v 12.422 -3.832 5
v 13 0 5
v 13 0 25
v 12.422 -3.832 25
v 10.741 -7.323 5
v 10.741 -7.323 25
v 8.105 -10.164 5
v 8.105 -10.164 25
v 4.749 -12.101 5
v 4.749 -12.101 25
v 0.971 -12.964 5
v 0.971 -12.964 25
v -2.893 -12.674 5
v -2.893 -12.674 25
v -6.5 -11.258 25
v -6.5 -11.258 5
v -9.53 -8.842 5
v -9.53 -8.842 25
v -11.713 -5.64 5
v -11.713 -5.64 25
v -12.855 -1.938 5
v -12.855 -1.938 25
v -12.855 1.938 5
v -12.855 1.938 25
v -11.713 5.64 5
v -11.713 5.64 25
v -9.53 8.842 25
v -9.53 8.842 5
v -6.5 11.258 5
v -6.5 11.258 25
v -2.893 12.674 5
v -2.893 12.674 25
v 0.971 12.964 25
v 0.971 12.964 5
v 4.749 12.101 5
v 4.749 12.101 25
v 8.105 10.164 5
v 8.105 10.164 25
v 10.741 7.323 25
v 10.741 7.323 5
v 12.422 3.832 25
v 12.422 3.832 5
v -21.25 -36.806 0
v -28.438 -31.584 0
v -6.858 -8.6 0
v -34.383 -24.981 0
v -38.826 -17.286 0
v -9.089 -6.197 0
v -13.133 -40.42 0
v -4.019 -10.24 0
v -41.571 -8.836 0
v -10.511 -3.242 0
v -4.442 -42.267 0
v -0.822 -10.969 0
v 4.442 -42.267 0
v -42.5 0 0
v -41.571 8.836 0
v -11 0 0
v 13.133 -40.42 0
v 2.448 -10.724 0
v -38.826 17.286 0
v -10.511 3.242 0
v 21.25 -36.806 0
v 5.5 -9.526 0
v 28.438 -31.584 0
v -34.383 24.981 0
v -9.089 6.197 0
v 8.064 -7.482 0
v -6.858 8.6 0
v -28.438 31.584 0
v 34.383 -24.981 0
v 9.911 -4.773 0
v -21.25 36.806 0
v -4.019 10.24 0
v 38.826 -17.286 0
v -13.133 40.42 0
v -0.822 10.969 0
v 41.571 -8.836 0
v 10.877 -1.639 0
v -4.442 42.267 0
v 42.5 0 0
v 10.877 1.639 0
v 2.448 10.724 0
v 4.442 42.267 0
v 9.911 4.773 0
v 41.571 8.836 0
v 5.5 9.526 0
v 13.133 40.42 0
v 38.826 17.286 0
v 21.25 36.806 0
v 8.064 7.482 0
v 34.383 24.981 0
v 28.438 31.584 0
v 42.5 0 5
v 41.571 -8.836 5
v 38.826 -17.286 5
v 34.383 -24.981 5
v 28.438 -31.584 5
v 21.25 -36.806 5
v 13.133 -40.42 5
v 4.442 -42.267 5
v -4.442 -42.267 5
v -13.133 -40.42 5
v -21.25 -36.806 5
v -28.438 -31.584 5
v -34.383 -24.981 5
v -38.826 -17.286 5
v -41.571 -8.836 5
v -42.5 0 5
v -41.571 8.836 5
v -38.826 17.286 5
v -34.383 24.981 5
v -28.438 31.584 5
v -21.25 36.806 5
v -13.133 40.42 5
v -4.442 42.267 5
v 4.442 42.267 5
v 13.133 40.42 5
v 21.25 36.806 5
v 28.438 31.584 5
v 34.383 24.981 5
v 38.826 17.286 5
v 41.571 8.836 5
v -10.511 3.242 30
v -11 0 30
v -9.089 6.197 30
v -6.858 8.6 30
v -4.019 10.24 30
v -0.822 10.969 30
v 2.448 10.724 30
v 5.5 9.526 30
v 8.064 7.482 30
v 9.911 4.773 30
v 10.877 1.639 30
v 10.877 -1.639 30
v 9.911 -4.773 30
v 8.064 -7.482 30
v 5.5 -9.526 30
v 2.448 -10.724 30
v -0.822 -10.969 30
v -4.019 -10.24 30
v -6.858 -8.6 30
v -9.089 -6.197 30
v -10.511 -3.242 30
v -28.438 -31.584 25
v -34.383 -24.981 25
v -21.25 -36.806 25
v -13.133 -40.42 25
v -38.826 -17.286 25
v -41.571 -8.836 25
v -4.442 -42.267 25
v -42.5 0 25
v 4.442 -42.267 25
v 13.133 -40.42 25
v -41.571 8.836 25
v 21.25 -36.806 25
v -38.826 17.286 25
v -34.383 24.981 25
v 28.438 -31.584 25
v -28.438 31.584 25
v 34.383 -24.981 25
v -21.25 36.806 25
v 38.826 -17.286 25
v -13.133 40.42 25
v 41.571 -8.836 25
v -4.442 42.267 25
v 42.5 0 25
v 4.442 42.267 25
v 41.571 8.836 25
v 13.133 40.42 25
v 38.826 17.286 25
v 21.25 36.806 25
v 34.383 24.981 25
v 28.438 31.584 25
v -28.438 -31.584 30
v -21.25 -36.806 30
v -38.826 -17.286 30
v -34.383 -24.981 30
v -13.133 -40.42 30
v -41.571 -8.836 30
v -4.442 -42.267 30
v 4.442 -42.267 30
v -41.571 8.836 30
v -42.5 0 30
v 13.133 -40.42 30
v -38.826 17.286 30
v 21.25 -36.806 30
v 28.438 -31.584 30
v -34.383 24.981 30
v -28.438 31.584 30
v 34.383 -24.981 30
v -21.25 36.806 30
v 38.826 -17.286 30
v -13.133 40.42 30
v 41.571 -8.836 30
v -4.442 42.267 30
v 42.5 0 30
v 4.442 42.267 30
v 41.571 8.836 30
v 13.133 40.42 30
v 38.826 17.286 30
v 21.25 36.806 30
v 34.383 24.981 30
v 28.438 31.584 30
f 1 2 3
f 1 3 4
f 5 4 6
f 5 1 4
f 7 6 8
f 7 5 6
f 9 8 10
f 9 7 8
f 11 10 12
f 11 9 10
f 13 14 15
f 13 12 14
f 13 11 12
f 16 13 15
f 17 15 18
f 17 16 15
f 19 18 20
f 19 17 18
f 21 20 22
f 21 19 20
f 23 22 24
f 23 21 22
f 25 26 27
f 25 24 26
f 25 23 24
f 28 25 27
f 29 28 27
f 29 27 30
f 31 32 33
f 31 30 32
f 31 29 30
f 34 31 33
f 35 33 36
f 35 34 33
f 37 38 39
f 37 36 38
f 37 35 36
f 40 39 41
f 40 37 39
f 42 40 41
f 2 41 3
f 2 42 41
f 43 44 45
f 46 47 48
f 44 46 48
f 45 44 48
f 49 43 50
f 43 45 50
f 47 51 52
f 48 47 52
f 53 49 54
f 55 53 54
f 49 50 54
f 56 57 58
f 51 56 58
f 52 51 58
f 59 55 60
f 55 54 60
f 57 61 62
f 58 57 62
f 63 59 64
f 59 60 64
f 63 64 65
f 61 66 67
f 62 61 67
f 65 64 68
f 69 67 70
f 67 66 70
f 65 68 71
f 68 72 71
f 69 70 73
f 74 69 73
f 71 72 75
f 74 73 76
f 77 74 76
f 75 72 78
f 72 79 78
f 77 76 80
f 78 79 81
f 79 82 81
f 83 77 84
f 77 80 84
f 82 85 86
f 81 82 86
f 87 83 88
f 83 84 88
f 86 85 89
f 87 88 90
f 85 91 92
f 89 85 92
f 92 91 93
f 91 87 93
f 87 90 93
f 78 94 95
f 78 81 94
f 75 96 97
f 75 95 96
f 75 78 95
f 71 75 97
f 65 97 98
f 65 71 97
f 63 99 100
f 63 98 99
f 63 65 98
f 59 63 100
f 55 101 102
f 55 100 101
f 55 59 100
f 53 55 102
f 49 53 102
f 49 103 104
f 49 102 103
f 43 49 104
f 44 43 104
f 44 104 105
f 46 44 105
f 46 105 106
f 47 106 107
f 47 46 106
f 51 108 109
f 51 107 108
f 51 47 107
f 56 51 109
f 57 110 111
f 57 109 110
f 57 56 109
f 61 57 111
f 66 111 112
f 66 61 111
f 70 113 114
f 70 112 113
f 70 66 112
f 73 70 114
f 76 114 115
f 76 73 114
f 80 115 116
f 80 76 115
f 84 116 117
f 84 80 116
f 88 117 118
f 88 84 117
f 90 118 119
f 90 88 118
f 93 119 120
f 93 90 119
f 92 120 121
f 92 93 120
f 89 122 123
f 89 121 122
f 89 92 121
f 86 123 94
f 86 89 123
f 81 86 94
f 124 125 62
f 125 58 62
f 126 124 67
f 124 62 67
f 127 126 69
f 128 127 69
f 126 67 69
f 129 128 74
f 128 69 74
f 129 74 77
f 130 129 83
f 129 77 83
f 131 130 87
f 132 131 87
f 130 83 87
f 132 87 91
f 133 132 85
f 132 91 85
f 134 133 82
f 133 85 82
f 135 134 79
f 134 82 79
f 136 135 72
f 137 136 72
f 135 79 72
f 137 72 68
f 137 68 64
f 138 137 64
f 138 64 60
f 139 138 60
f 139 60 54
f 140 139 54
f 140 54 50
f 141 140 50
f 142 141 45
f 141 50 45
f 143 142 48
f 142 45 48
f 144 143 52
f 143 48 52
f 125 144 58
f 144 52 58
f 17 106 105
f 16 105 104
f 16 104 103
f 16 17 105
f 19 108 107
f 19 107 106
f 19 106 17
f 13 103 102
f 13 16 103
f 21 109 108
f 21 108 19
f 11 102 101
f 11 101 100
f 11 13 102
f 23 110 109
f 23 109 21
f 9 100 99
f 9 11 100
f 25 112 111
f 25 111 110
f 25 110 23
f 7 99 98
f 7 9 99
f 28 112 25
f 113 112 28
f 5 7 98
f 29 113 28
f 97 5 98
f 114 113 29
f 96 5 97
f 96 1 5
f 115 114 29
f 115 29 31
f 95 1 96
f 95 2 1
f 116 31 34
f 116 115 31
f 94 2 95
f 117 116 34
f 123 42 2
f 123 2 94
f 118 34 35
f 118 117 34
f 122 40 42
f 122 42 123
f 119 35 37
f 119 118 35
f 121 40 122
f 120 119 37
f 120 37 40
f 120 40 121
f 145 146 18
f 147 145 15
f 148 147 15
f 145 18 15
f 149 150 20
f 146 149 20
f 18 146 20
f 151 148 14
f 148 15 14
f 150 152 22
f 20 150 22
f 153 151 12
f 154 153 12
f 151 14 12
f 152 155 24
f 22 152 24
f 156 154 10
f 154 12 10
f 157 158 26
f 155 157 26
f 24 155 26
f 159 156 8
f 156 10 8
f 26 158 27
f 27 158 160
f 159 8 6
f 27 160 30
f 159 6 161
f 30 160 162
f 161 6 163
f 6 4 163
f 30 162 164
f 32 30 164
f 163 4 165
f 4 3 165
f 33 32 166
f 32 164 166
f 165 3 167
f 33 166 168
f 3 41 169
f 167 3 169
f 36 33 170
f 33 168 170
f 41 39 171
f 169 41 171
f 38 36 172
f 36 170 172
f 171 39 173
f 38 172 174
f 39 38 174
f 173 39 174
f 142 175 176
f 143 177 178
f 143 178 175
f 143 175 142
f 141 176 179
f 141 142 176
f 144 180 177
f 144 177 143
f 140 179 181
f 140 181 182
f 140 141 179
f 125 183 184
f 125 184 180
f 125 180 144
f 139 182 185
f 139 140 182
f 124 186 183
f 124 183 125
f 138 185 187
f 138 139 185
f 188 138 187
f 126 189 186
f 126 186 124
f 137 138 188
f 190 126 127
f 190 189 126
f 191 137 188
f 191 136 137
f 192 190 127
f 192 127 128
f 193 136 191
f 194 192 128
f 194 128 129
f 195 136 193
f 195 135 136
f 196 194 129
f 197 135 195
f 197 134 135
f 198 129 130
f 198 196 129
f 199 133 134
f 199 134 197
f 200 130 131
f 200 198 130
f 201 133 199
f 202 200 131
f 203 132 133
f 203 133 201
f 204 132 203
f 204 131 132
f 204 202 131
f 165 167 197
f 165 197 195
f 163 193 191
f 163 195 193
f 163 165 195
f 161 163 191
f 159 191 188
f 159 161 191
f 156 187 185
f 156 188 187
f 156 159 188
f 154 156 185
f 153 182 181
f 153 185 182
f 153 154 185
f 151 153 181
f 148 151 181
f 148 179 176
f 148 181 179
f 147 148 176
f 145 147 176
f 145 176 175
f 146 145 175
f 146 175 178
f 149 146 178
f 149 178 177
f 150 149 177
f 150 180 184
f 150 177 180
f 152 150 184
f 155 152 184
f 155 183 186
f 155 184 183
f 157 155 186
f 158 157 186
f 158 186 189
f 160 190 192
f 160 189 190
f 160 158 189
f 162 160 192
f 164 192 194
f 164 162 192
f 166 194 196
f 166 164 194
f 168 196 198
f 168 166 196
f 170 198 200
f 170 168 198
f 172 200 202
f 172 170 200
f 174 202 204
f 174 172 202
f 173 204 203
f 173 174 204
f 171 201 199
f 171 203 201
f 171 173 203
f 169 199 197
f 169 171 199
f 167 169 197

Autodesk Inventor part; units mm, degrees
ref_plane "YZ Plane" through (0, 0, 0) normal (1, 0, 0) x (0, 1, 0)
ref_plane "XZ Plane" through (0, 0, 0) normal (0, 1, 0) x (-1, 0, 0)
ref_plane "XY Plane" through (0, 0, 0) normal (0, 0, 1) x (1, 0, 0)
sketch "Sketch1" plane through (0, 0, 0) normal (0, 0, 1) x (1, 0, 0)
  circle A0 centre (0, 0) radius 42.5
  dimension "d0" = 85
extrude "Extrusion1" add sketch "Sketch1" along normal blind 5
sketch "Sketch2" plane through (0, 0, 5) normal (0, 0, 1) x (1, 0, 0)
  circle A0 centre (0, 0) radius 13
  dimension "d3" = 26
extrude "Extrusion2" add sketch "Sketch2" along normal blind 20
sketch "Sketch3" plane through (0, 0, 25) normal (0, 0, 1) x (1, 0, 0)
  circle A0 centre (0, 0) radius 42.5
  dimension "d6" = 85
extrude "Extrusion3" add sketch "Sketch3" along normal blind 5
sketch "Sketch4" plane through (0, 0, 0) normal (0, 0, -1) x (-1, 0, 0)
  circle A0 centre (0, 0) radius 11
  dimension "d9" = 22
extrude "Extrusion4" cut sketch "Sketch4" against normal through all
properties part number "wire_spool_holder"
